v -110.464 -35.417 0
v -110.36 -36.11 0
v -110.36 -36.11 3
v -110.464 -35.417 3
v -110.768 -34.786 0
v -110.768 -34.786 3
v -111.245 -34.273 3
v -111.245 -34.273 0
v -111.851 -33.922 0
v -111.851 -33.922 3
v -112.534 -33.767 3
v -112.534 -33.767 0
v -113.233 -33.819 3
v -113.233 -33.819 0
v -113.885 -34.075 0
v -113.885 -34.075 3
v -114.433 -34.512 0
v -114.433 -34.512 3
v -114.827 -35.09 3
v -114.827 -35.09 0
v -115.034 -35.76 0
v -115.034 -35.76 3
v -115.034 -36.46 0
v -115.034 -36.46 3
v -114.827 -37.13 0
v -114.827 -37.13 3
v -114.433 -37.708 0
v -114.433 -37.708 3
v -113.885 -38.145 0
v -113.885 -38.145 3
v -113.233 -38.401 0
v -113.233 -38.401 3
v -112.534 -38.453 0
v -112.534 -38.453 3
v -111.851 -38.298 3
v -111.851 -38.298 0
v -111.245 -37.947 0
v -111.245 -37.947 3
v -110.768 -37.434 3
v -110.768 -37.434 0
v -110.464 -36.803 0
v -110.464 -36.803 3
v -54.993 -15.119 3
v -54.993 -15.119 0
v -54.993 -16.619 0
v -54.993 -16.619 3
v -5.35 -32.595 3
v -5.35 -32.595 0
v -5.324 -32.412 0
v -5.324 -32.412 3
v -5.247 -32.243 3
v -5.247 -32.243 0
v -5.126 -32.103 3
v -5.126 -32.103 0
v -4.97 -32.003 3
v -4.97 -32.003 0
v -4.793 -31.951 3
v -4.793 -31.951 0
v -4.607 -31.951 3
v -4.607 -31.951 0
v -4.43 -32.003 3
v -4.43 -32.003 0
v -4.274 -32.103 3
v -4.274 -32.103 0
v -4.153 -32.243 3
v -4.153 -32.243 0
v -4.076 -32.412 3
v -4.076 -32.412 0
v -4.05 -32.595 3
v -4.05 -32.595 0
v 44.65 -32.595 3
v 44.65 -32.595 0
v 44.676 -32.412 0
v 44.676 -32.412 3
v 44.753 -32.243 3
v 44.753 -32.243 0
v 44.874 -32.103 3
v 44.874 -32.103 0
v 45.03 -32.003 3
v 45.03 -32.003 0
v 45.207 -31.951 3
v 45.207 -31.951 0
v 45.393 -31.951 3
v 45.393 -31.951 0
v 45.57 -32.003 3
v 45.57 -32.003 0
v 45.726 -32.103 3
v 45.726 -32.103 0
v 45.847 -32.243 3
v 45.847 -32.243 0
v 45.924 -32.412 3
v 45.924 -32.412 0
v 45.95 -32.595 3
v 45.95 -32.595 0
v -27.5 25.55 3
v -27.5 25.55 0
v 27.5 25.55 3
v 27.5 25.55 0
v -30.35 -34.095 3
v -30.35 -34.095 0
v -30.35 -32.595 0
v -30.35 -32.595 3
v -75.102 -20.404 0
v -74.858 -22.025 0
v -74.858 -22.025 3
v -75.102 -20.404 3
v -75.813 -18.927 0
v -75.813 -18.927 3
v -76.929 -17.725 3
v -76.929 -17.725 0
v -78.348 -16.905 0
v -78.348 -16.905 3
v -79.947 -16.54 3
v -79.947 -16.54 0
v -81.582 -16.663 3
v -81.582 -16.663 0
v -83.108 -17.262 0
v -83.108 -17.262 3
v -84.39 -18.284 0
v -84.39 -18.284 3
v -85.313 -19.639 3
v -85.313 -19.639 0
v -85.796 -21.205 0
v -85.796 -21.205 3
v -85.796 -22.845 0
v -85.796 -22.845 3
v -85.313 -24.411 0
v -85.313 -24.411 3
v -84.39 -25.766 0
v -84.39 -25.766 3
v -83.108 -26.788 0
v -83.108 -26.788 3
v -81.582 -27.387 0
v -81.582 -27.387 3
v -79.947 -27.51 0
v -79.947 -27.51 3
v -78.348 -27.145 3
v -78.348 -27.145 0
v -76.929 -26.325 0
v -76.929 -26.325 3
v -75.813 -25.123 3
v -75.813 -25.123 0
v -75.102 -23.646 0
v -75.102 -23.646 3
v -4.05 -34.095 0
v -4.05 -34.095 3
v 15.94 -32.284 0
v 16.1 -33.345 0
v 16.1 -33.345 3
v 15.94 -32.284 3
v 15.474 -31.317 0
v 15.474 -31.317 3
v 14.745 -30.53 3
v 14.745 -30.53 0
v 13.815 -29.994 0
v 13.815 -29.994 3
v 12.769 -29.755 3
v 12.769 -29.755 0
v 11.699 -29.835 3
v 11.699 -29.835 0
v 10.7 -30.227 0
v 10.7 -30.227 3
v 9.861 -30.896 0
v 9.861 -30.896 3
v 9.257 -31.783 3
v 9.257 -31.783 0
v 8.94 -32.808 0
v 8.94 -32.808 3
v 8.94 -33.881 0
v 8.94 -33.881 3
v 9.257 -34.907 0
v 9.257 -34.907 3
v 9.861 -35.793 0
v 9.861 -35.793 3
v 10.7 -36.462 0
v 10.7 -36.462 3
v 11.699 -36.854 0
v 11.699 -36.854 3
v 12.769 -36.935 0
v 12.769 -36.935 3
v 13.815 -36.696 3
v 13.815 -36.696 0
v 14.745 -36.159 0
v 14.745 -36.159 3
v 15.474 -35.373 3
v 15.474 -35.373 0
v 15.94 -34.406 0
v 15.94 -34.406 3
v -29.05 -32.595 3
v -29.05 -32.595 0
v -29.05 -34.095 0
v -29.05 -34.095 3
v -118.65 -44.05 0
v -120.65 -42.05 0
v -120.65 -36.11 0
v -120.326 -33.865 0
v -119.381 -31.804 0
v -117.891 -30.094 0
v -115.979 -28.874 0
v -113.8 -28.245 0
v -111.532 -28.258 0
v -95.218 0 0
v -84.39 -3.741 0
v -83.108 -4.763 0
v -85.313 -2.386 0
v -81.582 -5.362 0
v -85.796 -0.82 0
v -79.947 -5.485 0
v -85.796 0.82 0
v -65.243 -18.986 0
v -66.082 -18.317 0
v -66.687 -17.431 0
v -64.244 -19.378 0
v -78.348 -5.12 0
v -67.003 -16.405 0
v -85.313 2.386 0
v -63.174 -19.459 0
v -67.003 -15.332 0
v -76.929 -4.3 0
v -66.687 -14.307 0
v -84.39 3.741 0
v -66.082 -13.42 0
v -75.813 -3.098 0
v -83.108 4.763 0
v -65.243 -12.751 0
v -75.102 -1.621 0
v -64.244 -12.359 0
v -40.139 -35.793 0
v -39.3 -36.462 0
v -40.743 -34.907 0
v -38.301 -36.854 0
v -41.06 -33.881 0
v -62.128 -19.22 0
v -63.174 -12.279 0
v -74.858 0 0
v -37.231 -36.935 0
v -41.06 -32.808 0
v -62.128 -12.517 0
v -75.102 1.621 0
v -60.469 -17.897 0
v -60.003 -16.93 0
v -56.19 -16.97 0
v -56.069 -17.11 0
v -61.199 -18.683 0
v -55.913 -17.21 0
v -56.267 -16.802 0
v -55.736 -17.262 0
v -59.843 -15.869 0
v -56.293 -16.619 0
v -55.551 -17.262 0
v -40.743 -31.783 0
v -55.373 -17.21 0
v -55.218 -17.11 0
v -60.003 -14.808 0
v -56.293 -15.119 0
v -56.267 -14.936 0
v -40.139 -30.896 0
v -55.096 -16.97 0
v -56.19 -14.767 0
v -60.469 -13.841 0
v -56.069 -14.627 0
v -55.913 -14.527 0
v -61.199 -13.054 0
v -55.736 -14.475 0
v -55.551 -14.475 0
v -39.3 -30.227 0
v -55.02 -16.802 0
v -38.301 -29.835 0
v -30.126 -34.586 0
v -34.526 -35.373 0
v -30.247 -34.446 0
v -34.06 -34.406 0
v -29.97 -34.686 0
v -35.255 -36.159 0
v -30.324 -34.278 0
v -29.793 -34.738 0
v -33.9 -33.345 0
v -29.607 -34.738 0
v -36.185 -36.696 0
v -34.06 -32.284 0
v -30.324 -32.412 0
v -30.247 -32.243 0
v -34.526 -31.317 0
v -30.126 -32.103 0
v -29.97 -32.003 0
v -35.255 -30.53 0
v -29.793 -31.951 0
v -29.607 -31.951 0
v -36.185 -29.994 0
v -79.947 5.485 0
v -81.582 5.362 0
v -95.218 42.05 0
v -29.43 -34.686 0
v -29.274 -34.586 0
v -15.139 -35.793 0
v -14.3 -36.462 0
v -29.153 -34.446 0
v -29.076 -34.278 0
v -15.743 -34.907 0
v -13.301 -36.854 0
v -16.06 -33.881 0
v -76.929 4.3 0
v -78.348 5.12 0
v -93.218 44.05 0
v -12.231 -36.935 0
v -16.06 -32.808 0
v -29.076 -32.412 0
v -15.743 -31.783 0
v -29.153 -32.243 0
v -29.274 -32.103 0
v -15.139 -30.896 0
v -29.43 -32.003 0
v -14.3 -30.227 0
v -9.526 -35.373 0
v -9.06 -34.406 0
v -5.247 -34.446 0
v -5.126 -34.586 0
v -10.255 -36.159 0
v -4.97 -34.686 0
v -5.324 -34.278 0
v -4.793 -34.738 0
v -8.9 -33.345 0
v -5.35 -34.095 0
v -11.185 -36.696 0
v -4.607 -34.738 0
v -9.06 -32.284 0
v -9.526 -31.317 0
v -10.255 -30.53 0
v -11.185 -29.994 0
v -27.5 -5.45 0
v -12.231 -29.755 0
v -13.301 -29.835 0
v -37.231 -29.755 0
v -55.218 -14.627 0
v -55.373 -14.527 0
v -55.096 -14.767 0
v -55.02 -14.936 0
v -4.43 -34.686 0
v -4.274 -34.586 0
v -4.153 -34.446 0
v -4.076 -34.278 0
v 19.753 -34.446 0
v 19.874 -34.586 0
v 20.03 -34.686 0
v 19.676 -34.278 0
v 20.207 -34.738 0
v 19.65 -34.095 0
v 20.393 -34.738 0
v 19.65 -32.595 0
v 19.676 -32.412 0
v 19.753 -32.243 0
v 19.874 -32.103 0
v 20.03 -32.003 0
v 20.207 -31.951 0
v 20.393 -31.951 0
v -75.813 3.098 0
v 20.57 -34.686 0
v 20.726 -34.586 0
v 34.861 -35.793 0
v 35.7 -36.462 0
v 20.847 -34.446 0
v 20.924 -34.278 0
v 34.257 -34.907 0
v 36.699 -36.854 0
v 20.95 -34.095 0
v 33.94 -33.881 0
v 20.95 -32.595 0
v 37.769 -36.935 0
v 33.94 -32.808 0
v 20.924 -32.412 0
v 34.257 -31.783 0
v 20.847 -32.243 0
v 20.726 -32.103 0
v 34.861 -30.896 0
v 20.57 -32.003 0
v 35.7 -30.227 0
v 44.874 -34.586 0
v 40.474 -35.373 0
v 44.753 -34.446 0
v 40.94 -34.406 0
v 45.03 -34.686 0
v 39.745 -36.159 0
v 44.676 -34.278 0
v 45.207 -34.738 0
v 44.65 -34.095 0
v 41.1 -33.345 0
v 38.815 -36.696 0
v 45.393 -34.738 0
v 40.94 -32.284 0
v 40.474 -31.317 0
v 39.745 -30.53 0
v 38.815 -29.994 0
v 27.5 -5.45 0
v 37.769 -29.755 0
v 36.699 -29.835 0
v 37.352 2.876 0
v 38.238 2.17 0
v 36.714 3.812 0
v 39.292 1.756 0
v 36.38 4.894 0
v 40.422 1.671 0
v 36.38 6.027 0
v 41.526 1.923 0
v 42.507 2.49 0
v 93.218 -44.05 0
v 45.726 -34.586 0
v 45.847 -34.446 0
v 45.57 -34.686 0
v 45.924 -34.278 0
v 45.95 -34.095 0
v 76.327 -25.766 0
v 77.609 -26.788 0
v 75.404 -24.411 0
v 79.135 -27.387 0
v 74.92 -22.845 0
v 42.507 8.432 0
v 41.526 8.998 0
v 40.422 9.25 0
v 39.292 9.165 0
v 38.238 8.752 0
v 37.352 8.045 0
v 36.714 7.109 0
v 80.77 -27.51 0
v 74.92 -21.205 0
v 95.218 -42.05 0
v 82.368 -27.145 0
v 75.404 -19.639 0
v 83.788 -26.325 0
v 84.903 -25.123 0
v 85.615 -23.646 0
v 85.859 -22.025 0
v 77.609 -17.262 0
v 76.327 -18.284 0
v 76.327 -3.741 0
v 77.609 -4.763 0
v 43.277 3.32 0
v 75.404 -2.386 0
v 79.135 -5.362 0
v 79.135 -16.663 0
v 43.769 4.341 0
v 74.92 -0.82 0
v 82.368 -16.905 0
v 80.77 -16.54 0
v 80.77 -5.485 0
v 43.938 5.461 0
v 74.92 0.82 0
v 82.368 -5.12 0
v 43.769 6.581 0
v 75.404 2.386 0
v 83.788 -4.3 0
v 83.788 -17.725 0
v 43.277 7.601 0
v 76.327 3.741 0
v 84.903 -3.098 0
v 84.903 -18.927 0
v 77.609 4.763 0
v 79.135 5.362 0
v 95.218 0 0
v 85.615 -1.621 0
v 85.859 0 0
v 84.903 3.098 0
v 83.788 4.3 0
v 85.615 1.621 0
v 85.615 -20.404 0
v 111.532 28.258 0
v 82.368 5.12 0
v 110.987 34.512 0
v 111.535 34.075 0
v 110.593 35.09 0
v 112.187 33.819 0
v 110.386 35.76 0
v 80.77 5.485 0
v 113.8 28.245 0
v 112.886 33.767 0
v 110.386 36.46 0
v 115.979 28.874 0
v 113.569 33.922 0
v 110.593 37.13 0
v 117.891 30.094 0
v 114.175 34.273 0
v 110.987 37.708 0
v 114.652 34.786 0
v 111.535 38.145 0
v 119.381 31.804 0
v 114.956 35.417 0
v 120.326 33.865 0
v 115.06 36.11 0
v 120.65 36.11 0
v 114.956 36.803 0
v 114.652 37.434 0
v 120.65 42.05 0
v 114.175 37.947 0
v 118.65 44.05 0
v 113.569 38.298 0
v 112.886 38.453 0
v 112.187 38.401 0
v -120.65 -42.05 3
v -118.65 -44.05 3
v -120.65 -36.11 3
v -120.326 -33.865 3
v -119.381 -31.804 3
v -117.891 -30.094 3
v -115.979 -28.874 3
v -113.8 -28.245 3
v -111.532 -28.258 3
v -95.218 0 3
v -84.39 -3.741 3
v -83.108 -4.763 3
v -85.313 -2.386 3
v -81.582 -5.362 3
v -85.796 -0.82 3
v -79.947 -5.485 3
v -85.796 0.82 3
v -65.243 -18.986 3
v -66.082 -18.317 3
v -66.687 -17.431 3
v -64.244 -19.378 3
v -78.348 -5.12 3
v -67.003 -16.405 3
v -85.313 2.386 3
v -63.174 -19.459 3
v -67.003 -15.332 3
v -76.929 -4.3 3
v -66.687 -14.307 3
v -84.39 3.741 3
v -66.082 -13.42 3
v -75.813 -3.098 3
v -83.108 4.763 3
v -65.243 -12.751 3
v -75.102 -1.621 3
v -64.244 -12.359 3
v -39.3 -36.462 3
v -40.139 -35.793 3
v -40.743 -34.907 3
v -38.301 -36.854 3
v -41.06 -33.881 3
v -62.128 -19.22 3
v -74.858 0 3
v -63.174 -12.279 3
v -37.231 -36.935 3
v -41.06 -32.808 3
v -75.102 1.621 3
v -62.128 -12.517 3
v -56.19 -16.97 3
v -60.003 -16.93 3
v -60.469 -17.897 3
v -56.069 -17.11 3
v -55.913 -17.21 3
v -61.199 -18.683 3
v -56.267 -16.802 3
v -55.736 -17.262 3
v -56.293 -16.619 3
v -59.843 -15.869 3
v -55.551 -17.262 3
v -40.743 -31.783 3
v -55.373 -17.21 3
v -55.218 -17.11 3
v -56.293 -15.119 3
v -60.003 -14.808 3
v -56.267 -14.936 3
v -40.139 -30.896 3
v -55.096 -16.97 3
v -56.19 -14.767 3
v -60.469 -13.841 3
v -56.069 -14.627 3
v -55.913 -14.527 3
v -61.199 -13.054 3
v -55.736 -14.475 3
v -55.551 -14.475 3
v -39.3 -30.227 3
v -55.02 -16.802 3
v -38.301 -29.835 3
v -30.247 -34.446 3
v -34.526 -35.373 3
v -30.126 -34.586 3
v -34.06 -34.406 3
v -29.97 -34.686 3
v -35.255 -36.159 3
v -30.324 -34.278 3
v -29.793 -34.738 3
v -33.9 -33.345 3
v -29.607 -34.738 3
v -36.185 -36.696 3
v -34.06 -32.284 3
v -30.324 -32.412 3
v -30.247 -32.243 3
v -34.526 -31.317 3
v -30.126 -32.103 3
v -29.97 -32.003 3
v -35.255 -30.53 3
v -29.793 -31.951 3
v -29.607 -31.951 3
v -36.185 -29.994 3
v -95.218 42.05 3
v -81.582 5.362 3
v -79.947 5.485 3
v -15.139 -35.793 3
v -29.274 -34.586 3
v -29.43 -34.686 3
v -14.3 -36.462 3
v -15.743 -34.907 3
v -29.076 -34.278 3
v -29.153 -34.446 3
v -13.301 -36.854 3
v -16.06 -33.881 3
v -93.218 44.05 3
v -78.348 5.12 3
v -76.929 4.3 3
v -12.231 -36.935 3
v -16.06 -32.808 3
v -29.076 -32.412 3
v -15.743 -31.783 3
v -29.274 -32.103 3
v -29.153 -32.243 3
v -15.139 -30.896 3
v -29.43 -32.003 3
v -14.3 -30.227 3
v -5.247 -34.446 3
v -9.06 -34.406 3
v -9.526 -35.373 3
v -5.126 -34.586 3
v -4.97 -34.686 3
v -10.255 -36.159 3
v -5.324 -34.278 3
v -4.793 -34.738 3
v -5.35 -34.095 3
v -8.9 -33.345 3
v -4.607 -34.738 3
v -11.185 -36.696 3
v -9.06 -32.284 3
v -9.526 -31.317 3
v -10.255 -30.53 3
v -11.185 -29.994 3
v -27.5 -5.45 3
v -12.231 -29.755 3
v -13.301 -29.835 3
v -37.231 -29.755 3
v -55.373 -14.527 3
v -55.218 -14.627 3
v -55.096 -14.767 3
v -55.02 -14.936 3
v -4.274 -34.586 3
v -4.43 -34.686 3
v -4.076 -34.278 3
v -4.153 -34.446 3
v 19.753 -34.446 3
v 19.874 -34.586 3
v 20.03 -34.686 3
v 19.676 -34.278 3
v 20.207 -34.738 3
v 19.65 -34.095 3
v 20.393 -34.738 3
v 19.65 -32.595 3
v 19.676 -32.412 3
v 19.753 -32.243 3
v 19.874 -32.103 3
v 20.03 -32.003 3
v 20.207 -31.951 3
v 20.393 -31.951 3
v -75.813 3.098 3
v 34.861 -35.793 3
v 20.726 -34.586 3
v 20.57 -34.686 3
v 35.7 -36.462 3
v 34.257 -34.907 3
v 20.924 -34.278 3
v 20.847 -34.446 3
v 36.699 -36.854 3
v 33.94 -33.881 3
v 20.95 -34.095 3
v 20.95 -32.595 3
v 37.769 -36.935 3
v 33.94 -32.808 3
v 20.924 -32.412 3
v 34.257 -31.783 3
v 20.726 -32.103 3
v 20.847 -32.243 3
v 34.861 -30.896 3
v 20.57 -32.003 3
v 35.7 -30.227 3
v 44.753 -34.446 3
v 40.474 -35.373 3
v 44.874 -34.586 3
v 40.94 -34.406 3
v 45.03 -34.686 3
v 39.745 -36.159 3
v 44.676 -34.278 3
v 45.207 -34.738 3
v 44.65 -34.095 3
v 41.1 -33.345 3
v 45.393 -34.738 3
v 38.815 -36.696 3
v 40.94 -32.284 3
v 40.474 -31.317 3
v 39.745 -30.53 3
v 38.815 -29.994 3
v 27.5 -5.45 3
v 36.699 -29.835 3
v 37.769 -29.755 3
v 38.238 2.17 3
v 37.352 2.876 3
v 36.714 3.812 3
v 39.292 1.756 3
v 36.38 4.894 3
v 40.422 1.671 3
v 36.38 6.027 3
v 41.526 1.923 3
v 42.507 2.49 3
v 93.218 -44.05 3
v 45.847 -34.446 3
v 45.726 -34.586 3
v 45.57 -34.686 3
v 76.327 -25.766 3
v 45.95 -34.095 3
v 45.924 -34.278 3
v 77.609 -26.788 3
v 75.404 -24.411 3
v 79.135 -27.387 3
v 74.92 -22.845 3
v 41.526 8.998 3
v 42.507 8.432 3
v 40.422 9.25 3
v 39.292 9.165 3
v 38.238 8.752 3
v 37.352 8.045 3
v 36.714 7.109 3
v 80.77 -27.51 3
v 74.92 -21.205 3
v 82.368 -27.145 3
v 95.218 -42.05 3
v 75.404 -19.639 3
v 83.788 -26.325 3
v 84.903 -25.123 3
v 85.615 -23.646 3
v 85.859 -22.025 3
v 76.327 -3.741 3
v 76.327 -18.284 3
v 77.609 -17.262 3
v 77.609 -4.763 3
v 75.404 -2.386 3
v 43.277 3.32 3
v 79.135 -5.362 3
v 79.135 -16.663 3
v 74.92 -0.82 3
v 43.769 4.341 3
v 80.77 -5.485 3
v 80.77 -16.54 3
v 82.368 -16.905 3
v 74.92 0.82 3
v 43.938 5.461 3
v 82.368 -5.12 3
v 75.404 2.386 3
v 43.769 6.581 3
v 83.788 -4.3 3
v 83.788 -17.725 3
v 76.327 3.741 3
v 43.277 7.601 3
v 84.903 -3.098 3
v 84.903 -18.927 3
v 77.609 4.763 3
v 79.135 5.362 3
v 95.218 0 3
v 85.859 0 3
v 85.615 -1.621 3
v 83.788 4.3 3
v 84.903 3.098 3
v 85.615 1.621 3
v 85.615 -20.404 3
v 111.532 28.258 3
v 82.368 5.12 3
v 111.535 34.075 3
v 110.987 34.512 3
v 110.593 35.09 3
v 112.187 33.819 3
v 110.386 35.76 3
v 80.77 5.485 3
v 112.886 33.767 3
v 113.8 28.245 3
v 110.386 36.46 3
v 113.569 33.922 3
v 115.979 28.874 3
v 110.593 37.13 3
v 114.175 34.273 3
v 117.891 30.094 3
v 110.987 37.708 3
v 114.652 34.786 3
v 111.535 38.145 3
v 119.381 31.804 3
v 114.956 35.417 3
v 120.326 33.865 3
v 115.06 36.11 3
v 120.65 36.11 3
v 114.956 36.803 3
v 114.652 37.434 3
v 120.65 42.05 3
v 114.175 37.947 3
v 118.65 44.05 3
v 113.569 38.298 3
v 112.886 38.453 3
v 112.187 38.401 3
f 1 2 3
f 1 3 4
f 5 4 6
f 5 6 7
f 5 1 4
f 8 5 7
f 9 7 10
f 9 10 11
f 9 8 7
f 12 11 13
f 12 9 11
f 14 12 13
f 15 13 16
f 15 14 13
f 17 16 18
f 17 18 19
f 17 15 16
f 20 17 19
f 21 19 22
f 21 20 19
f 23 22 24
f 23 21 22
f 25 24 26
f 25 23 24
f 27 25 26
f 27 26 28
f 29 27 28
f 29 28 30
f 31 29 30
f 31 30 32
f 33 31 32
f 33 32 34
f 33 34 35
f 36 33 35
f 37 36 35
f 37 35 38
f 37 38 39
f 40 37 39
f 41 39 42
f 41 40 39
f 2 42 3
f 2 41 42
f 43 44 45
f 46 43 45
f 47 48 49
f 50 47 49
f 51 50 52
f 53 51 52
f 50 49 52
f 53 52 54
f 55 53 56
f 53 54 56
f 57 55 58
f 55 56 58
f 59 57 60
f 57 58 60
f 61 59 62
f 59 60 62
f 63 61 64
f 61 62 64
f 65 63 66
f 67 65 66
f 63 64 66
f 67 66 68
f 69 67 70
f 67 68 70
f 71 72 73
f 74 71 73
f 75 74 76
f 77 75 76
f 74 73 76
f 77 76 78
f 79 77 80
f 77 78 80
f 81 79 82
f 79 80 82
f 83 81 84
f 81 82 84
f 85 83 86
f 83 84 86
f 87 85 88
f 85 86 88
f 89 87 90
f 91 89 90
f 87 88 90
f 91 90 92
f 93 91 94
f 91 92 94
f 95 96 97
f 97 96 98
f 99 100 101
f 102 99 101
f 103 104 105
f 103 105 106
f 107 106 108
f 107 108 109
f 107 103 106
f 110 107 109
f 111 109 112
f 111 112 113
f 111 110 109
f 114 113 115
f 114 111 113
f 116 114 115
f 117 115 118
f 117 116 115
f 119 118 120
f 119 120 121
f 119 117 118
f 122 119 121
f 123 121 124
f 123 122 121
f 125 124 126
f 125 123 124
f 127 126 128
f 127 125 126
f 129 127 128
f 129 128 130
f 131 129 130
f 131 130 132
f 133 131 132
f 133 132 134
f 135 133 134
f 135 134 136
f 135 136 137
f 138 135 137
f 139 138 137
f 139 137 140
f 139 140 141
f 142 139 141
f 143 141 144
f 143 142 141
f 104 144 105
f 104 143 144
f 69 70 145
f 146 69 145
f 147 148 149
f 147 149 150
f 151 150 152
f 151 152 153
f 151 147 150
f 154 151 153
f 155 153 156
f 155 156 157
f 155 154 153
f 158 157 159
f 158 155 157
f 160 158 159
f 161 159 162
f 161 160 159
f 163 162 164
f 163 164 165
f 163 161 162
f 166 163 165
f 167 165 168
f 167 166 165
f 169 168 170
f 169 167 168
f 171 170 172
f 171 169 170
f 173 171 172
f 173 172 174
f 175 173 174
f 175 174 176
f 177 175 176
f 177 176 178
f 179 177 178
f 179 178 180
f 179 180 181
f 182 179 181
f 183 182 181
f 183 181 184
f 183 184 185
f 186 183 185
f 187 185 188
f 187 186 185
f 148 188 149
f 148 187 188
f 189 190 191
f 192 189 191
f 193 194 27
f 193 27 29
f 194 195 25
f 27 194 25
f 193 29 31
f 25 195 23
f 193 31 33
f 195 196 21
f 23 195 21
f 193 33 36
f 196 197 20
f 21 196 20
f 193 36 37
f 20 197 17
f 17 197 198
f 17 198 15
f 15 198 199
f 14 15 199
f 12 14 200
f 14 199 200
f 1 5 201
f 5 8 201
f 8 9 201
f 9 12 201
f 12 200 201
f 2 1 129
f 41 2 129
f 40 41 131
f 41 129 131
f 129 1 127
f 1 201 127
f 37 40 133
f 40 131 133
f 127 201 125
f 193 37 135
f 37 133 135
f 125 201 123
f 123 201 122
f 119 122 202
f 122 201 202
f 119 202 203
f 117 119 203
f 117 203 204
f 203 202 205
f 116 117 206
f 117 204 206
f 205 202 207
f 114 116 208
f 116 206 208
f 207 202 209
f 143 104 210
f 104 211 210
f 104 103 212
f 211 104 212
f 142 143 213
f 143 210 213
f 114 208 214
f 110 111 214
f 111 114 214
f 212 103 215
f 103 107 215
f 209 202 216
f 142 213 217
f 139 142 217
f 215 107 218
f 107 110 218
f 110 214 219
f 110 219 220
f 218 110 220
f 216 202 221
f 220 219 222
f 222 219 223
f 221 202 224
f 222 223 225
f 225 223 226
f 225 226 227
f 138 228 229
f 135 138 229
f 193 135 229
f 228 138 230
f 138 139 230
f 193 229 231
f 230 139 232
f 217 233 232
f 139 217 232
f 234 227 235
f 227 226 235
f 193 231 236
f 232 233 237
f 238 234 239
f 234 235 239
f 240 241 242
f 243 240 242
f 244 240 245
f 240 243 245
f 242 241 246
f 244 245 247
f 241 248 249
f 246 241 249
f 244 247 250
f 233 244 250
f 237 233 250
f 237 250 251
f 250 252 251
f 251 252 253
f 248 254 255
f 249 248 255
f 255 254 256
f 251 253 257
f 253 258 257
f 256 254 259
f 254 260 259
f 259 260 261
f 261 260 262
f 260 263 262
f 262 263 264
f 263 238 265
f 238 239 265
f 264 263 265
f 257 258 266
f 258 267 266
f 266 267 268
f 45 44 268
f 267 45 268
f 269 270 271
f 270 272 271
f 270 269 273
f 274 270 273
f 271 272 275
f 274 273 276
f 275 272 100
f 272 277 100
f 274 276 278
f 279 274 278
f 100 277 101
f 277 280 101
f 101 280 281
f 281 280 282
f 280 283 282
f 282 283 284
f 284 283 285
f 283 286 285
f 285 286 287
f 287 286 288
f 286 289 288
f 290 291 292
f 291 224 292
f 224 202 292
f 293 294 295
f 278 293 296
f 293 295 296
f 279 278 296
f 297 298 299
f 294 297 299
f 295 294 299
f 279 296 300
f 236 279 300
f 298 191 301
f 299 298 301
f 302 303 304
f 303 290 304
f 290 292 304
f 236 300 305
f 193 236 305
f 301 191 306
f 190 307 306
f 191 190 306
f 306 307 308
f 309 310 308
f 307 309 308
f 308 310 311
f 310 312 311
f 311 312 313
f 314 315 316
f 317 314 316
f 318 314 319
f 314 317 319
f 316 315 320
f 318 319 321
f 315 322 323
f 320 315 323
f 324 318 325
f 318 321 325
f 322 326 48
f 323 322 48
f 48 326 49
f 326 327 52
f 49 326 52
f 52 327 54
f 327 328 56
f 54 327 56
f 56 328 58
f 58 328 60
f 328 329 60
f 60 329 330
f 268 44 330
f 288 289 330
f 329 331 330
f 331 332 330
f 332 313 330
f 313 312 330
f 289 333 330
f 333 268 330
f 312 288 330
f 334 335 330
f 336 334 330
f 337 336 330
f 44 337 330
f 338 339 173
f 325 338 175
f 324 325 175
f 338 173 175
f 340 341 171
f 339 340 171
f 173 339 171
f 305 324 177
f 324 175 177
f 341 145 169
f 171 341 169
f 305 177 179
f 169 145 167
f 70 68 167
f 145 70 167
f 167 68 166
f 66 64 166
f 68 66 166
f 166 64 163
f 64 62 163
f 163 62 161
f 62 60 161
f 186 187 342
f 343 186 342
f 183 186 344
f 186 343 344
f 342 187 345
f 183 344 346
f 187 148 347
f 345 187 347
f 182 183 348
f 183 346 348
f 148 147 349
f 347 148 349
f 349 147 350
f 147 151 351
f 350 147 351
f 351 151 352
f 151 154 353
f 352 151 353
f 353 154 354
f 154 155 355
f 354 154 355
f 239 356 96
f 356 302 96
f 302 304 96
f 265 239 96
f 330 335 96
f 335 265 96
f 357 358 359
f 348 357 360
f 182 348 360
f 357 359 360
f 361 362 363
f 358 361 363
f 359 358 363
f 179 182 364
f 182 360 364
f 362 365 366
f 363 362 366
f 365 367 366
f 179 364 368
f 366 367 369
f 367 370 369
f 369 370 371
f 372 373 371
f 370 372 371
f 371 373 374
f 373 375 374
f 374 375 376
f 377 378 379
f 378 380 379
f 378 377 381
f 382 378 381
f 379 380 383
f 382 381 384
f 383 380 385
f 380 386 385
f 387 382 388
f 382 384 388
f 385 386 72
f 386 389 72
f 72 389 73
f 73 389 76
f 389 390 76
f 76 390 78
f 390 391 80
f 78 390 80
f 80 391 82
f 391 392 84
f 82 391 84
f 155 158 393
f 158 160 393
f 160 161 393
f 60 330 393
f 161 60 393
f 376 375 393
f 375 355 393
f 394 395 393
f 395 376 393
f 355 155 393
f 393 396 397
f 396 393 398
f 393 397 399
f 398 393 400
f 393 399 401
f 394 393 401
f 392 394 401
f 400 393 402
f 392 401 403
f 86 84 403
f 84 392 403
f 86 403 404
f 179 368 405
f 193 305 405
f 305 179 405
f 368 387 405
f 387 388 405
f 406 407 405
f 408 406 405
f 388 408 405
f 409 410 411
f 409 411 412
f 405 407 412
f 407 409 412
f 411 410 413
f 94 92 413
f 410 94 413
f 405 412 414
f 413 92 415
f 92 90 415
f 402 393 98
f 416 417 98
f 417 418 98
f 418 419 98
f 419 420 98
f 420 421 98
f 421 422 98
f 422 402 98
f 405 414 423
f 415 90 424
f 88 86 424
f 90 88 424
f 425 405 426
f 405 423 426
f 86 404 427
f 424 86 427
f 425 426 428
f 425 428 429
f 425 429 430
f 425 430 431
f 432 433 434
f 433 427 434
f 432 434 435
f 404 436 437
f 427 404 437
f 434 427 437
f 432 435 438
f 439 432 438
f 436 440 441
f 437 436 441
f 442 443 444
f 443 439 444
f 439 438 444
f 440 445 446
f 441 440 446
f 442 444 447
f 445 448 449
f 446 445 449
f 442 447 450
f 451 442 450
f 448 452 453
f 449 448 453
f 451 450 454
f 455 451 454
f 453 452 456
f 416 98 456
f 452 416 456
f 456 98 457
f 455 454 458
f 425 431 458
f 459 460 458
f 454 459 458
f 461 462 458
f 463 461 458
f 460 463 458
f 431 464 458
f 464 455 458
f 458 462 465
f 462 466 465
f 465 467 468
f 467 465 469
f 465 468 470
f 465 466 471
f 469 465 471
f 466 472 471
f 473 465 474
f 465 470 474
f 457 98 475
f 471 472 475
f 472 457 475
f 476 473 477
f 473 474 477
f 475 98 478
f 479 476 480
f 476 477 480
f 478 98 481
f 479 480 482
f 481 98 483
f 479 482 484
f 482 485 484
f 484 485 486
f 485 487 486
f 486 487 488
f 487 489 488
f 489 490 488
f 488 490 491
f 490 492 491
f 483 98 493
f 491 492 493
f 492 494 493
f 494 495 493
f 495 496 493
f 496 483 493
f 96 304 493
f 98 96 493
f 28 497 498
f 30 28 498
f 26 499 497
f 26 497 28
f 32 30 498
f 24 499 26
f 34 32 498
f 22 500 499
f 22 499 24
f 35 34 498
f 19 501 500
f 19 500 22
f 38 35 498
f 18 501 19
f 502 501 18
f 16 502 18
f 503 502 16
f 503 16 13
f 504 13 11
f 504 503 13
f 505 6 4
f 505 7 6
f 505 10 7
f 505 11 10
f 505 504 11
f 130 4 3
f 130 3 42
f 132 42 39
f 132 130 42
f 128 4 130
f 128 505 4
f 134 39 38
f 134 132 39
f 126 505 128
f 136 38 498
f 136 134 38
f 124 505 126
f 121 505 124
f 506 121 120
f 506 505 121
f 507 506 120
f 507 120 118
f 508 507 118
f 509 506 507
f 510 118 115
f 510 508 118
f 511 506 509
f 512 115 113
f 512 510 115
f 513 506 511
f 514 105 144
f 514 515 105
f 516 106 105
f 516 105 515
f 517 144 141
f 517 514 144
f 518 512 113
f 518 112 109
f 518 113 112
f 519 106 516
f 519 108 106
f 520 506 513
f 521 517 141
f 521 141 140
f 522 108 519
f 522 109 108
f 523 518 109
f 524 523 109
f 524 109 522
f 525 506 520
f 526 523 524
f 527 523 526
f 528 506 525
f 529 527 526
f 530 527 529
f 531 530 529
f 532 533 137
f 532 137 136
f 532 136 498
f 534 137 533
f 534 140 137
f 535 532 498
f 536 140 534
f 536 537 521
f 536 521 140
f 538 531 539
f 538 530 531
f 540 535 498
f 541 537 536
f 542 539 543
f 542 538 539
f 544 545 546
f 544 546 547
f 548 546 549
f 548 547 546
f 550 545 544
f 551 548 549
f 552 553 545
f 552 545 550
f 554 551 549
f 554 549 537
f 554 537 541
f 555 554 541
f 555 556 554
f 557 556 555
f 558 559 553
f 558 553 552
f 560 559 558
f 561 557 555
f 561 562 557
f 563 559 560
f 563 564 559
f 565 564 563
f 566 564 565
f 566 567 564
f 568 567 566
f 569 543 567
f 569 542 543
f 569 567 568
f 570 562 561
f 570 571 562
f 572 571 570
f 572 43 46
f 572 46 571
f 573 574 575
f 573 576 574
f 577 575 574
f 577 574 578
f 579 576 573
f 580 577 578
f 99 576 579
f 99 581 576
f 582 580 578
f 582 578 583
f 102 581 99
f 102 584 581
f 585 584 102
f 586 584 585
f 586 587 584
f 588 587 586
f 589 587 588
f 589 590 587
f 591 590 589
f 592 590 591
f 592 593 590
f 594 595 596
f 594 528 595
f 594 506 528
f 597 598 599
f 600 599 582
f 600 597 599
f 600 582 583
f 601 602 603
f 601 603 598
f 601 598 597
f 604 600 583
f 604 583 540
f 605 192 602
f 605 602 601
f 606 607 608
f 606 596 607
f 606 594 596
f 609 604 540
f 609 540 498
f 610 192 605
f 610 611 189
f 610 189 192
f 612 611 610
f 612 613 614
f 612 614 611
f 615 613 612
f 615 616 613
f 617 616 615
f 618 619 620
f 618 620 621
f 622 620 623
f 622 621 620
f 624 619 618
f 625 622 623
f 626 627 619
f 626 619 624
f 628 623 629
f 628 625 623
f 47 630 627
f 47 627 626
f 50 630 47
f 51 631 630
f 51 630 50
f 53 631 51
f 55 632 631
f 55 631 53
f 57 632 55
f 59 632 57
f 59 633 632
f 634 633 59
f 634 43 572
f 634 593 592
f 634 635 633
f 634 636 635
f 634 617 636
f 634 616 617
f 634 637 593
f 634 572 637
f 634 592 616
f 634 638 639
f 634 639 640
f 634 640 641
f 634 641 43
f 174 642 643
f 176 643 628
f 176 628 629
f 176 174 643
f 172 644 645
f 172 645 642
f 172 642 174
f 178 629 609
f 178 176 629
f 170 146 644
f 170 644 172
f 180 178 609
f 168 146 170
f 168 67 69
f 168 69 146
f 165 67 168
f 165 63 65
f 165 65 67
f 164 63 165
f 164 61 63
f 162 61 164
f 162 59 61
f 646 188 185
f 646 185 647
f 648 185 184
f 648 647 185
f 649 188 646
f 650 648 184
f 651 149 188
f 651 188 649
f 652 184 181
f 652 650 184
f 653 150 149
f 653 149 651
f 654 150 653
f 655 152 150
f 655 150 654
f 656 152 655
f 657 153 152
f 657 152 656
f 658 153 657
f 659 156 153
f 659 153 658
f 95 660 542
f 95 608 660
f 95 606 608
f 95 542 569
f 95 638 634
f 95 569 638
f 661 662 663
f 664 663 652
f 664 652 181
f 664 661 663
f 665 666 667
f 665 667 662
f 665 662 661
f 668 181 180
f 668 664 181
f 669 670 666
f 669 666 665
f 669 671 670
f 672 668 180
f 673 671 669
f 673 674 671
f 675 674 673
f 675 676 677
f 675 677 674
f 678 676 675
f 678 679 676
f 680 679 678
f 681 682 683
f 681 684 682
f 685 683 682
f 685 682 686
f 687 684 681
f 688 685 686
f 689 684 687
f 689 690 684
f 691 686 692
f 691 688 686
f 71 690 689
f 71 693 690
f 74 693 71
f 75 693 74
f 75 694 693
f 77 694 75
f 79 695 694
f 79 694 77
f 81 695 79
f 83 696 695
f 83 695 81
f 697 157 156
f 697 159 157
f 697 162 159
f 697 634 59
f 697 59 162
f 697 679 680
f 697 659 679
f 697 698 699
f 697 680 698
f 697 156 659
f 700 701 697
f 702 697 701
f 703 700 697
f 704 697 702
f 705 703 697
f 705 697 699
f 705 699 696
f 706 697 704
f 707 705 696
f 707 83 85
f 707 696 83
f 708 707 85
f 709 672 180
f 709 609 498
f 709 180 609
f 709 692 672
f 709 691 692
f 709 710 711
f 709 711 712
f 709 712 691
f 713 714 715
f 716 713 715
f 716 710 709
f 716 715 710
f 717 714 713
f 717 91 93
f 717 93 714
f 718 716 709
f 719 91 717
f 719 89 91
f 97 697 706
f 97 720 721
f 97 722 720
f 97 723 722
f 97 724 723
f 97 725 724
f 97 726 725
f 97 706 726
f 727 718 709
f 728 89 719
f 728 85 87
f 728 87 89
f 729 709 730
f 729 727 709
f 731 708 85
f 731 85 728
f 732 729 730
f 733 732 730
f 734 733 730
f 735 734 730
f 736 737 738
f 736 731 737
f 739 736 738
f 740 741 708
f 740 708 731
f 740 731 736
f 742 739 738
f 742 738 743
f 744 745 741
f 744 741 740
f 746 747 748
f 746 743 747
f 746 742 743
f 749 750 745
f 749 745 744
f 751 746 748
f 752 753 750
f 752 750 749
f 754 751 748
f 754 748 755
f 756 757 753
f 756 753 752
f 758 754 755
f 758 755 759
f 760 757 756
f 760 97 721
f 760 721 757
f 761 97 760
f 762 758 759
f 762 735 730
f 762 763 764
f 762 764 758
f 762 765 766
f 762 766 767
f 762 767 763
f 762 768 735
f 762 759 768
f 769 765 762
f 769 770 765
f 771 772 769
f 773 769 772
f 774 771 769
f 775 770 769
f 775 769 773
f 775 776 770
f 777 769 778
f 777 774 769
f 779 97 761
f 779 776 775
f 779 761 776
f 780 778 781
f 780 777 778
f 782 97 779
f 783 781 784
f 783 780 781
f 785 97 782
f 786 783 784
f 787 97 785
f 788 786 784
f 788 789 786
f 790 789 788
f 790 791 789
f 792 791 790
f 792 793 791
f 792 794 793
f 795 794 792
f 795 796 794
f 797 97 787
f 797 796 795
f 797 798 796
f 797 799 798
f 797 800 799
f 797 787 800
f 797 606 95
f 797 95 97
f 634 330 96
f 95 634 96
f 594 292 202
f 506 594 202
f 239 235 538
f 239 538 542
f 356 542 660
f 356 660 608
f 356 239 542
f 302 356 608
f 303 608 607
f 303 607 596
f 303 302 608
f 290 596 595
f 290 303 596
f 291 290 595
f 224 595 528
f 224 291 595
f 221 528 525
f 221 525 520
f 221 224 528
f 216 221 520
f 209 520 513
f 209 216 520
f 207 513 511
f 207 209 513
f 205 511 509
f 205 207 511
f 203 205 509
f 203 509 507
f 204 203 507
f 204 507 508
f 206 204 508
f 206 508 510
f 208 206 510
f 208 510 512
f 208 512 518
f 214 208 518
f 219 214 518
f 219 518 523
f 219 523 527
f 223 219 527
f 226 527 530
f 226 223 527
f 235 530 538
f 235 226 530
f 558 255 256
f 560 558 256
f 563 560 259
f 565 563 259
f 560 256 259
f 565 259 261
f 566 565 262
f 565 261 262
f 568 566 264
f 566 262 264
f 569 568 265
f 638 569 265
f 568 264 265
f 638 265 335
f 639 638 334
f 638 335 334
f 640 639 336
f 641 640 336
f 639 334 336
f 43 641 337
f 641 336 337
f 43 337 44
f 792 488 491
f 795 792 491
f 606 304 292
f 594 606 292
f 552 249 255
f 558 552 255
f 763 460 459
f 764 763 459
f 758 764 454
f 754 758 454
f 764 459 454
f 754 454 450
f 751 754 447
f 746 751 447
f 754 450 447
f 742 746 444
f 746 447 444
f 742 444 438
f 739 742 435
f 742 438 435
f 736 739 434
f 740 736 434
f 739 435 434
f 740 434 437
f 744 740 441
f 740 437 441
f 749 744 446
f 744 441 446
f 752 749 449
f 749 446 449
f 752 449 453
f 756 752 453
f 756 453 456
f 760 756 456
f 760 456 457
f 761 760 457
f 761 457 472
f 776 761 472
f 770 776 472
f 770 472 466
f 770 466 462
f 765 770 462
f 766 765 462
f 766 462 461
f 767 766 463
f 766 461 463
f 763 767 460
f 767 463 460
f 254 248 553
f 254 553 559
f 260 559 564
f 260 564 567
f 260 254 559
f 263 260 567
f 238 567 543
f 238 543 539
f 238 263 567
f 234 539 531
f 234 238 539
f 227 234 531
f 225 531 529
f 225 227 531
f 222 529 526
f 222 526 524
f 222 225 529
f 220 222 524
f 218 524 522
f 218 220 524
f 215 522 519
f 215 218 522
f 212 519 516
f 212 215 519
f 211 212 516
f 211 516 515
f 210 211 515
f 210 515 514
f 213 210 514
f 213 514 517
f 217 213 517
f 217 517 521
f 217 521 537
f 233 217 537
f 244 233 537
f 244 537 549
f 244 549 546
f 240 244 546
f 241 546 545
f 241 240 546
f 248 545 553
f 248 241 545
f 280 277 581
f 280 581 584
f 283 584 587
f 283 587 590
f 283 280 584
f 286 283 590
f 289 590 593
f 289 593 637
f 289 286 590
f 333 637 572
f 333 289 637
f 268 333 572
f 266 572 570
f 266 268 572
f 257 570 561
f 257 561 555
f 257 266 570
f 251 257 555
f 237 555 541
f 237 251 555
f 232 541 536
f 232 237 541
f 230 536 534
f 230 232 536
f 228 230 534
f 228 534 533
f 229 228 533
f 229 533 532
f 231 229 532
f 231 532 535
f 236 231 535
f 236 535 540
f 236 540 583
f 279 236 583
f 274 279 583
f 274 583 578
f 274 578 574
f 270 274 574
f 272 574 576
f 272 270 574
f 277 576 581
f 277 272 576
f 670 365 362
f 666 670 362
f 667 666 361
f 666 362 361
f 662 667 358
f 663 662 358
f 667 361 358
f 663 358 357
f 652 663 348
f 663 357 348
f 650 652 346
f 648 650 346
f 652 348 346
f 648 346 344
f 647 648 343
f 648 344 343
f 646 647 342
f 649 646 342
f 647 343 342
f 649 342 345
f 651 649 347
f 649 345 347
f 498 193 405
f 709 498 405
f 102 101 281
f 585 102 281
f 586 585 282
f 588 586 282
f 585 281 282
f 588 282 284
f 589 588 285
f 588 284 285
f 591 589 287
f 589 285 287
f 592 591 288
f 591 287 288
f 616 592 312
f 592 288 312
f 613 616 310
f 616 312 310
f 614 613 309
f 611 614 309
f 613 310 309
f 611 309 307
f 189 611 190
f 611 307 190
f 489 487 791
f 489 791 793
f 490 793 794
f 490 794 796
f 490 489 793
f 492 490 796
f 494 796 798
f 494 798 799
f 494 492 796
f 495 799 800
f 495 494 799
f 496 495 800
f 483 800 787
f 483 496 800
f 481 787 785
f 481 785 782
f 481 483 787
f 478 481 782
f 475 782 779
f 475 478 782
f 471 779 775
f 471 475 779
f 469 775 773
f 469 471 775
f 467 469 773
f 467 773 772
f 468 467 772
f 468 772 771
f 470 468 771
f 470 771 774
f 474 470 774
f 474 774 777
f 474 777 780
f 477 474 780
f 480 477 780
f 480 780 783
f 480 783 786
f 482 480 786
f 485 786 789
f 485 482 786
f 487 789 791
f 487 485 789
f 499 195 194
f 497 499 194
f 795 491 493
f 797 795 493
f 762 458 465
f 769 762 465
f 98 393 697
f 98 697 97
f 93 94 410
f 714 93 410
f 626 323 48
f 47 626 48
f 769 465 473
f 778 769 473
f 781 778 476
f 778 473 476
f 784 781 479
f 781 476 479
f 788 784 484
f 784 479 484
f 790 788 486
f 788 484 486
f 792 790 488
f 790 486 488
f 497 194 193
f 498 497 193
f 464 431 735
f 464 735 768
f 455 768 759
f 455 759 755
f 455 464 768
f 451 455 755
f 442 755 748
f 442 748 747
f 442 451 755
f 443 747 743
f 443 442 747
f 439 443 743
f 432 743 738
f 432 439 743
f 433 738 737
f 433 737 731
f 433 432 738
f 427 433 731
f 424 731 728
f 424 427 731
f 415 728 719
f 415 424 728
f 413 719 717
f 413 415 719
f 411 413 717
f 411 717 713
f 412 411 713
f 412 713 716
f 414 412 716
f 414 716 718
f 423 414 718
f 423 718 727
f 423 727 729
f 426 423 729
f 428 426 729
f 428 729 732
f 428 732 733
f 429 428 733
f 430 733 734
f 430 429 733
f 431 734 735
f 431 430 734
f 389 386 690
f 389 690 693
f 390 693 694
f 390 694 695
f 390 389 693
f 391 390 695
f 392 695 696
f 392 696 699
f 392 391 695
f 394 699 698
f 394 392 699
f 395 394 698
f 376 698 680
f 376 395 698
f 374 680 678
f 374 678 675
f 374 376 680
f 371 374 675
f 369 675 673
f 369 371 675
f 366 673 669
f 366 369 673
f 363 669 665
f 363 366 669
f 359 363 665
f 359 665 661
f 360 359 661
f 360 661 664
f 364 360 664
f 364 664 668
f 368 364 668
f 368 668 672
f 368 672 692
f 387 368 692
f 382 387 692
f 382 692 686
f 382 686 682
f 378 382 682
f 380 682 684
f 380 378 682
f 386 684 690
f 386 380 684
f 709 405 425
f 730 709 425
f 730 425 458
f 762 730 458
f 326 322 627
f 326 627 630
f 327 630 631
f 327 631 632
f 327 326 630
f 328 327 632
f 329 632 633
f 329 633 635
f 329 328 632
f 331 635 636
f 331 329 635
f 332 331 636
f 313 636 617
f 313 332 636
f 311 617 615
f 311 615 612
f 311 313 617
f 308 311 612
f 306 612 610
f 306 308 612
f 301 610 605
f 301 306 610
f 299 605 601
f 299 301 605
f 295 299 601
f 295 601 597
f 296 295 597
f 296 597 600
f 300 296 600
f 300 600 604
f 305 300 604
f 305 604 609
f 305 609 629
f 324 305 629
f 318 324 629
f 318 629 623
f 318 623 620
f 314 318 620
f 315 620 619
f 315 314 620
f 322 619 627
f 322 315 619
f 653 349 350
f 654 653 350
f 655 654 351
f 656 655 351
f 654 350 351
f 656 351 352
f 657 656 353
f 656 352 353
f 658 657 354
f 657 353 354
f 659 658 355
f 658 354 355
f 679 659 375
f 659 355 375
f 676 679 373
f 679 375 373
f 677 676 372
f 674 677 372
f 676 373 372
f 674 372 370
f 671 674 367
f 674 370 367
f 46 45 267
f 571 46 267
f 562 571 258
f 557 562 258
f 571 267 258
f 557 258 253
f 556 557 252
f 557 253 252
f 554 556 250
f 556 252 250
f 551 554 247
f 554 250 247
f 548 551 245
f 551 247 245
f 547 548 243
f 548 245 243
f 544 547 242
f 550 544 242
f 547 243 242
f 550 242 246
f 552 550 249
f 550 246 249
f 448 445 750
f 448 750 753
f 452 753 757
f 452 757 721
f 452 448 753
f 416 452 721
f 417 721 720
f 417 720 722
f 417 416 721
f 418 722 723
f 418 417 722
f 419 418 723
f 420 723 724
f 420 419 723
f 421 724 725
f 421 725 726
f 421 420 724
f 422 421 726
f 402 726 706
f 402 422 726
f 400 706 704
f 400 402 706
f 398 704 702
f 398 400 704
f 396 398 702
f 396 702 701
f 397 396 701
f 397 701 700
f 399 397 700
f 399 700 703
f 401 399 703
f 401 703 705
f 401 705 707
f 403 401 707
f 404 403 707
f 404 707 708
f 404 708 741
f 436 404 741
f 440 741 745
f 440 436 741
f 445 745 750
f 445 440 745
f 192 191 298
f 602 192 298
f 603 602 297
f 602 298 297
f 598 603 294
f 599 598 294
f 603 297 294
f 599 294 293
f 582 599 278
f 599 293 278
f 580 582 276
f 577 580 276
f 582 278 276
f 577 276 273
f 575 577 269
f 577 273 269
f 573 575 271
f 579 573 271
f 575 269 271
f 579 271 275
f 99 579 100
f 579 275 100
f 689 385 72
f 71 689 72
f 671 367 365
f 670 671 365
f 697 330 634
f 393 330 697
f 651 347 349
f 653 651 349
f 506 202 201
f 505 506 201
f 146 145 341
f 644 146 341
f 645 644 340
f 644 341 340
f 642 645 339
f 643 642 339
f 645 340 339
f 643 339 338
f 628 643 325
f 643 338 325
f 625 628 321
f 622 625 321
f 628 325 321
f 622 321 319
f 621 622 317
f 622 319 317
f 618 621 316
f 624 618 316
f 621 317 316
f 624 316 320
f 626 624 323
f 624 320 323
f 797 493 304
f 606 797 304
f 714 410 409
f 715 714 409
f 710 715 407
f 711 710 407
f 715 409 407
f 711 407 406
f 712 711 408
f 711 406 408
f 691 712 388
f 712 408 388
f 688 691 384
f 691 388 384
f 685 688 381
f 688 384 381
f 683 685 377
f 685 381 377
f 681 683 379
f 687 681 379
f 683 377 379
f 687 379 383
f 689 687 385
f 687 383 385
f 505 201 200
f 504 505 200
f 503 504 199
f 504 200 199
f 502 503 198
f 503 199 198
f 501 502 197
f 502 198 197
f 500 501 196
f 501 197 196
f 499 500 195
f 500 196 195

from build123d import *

# Parameters (mm, degrees)
SKETCH1_R           = 2.35
SKETCH1_R_2         = 5.5
SKETCH1_R_3         = 3.6
SKETCH1_R_4         = 3.8
SKETCH1_W           = 55
SKETCH1_H           = 31
BOSS_EXTRUDE1_DEPTH = 3


with BuildPart() as part:
    # Sketch1 → Boss-Extrude1 (new body)
    with BuildSketch(Plane.XY):
        with BuildLine():
            Line((-95.217720642, 42.05), (-95.217720642, 0))
            Line((-95.217720642, 0), (-111.532377856, -28.257815203))
            ThreePointArc((-111.532377856, -28.257815203), (-117.891374344, -30.093609063), (-120.65, -36.11))
            Line((-120.65, -36.11), (-120.65, -42.05))
            Line((-120.65, -42.05), (-118.65, -44.05))
            Line((-118.65, -44.05), (93.217720642, -44.05))
            Line((93.217720642, -44.05), (95.217720642, -42.05))
            Line((95.217720642, -42.05), (95.217720642, 0))
            Line((95.217720642, 0), (111.532377856, 28.257815203))
            ThreePointArc((111.532377856, 28.257815203), (117.891374344, 30.093609063), (120.65, 36.11))
            Line((120.65, 36.11), (120.65, 42.05))
            Line((120.65, 42.05), (118.65, 44.05))
            Line((118.65, 44.05), (-93.217720642, 44.05))
            Line((-93.217720642, 44.05), (-95.217720642, 42.05))
        make_face()
        with Locations((-112.71, -36.11)):
            Circle(SKETCH1_R, mode=Mode.SUBTRACT)
        with Locations((-80.357720642, -22.025)):
            Circle(SKETCH1_R_2, mode=Mode.SUBTRACT)
        with Locations((-37.5, -33.344646258)):
            Circle(SKETCH1_R_3, mode=Mode.SUBTRACT)
        with BuildLine():
            ThreePointArc((-30.35, -32.594646258), (-29.7, -31.944646258), (-29.05, -32.594646258))
            Line((-29.05, -32.594646258), (-29.05, -34.094646258))
            ThreePointArc((-29.05, -34.094646258), (-29.7, -34.744646258), (-30.35, -34.094646258))
            Line((-30.35, -34.094646258), (-30.35, -32.594646258))
        make_face(mode=Mode.SUBTRACT)
        with Locations((-12.5, -33.344646258)):
            Circle(SKETCH1_R_3, mode=Mode.SUBTRACT)
        with BuildLine():
            Line((-5.35, -34.094646258), (-5.35, -32.594646258))
            ThreePointArc((-5.35, -32.594646258), (-4.7, -31.944646258), (-4.05, -32.594646258))
            Line((-4.05, -32.594646258), (-4.05, -34.094646258))
            ThreePointArc((-4.05, -34.094646258), (-4.7, -34.744646258), (-5.35, -34.094646258))
        make_face(mode=Mode.SUBTRACT)
        with Locations((12.5, -33.344646258)):
            Circle(SKETCH1_R_3, mode=Mode.SUBTRACT)
        with BuildLine():
            Line((19.65, -34.094646258), (19.65, -32.594646258))
            ThreePointArc((19.65, -32.594646258), (20.3, -31.944646258), (20.95, -32.594646258))
            Line((20.95, -32.594646258), (20.95, -34.094646258))
            ThreePointArc((20.95, -34.094646258), (20.3, -34.744646258), (19.65, -34.094646258))
        make_face(mode=Mode.SUBTRACT)
        with Locations((37.5, -33.344646258)):
            Circle(SKETCH1_R_3, mode=Mode.SUBTRACT)
        with BuildLine():
            Line((44.65, -34.094646258), (44.65, -32.594646258))
            ThreePointArc((44.65, -32.594646258), (45.3, -31.944646258), (45.95, -32.594646258))
            Line((45.95, -32.594646258), (45.95, -34.094646258))
            ThreePointArc((45.95, -34.094646258), (45.3, -34.744646258), (44.65, -34.094646258))
        make_face(mode=Mode.SUBTRACT)
        with Locations((80.358860321, -22.025)):
            Circle(SKETCH1_R_2, mode=Mode.SUBTRACT)
        with Locations((-80.357720642, 0)):
            Circle(SKETCH1_R_2, mode=Mode.SUBTRACT)
        with Locations((40.137585267, 5.460707483)):
            Circle(SKETCH1_R_4, mode=Mode.SUBTRACT)
        with Locations((0, 10.05)):
            Rectangle(SKETCH1_W, SKETCH1_H, mode=Mode.SUBTRACT)
        with BuildLine():
            ThreePointArc((74.858860321, 0), (80.358860321, 5.5), (85.858860321, 0))
            ThreePointArc((85.858860321, 0), (80.358860321, -5.5), (74.858860321, 0))
        make_face(mode=Mode.SUBTRACT)
        with Locations((112.71, 36.11)):
            Circle(SKETCH1_R, mode=Mode.SUBTRACT)
        with BuildLine():
            ThreePointArc((-54.993253468, -16.61863742), (-55.643253468, -17.26863742), (-56.293253468, -16.61863742))
            Line((-56.293253468, -16.61863742), (-56.293253468, -15.11863742))
            ThreePointArc((-56.293253468, -15.11863742), (-55.643253468, -14.46863742), (-54.993253468, -15.11863742))
            Line((-54.993253468, -15.11863742), (-54.993253468, -16.61863742))
        make_face(mode=Mode.SUBTRACT)
        with Locations((-63.443253468, -15.86863742)):
            Circle(SKETCH1_R_3, mode=Mode.SUBTRACT)
    extrude(amount=BOSS_EXTRUDE1_DEPTH)


solid = part.part
